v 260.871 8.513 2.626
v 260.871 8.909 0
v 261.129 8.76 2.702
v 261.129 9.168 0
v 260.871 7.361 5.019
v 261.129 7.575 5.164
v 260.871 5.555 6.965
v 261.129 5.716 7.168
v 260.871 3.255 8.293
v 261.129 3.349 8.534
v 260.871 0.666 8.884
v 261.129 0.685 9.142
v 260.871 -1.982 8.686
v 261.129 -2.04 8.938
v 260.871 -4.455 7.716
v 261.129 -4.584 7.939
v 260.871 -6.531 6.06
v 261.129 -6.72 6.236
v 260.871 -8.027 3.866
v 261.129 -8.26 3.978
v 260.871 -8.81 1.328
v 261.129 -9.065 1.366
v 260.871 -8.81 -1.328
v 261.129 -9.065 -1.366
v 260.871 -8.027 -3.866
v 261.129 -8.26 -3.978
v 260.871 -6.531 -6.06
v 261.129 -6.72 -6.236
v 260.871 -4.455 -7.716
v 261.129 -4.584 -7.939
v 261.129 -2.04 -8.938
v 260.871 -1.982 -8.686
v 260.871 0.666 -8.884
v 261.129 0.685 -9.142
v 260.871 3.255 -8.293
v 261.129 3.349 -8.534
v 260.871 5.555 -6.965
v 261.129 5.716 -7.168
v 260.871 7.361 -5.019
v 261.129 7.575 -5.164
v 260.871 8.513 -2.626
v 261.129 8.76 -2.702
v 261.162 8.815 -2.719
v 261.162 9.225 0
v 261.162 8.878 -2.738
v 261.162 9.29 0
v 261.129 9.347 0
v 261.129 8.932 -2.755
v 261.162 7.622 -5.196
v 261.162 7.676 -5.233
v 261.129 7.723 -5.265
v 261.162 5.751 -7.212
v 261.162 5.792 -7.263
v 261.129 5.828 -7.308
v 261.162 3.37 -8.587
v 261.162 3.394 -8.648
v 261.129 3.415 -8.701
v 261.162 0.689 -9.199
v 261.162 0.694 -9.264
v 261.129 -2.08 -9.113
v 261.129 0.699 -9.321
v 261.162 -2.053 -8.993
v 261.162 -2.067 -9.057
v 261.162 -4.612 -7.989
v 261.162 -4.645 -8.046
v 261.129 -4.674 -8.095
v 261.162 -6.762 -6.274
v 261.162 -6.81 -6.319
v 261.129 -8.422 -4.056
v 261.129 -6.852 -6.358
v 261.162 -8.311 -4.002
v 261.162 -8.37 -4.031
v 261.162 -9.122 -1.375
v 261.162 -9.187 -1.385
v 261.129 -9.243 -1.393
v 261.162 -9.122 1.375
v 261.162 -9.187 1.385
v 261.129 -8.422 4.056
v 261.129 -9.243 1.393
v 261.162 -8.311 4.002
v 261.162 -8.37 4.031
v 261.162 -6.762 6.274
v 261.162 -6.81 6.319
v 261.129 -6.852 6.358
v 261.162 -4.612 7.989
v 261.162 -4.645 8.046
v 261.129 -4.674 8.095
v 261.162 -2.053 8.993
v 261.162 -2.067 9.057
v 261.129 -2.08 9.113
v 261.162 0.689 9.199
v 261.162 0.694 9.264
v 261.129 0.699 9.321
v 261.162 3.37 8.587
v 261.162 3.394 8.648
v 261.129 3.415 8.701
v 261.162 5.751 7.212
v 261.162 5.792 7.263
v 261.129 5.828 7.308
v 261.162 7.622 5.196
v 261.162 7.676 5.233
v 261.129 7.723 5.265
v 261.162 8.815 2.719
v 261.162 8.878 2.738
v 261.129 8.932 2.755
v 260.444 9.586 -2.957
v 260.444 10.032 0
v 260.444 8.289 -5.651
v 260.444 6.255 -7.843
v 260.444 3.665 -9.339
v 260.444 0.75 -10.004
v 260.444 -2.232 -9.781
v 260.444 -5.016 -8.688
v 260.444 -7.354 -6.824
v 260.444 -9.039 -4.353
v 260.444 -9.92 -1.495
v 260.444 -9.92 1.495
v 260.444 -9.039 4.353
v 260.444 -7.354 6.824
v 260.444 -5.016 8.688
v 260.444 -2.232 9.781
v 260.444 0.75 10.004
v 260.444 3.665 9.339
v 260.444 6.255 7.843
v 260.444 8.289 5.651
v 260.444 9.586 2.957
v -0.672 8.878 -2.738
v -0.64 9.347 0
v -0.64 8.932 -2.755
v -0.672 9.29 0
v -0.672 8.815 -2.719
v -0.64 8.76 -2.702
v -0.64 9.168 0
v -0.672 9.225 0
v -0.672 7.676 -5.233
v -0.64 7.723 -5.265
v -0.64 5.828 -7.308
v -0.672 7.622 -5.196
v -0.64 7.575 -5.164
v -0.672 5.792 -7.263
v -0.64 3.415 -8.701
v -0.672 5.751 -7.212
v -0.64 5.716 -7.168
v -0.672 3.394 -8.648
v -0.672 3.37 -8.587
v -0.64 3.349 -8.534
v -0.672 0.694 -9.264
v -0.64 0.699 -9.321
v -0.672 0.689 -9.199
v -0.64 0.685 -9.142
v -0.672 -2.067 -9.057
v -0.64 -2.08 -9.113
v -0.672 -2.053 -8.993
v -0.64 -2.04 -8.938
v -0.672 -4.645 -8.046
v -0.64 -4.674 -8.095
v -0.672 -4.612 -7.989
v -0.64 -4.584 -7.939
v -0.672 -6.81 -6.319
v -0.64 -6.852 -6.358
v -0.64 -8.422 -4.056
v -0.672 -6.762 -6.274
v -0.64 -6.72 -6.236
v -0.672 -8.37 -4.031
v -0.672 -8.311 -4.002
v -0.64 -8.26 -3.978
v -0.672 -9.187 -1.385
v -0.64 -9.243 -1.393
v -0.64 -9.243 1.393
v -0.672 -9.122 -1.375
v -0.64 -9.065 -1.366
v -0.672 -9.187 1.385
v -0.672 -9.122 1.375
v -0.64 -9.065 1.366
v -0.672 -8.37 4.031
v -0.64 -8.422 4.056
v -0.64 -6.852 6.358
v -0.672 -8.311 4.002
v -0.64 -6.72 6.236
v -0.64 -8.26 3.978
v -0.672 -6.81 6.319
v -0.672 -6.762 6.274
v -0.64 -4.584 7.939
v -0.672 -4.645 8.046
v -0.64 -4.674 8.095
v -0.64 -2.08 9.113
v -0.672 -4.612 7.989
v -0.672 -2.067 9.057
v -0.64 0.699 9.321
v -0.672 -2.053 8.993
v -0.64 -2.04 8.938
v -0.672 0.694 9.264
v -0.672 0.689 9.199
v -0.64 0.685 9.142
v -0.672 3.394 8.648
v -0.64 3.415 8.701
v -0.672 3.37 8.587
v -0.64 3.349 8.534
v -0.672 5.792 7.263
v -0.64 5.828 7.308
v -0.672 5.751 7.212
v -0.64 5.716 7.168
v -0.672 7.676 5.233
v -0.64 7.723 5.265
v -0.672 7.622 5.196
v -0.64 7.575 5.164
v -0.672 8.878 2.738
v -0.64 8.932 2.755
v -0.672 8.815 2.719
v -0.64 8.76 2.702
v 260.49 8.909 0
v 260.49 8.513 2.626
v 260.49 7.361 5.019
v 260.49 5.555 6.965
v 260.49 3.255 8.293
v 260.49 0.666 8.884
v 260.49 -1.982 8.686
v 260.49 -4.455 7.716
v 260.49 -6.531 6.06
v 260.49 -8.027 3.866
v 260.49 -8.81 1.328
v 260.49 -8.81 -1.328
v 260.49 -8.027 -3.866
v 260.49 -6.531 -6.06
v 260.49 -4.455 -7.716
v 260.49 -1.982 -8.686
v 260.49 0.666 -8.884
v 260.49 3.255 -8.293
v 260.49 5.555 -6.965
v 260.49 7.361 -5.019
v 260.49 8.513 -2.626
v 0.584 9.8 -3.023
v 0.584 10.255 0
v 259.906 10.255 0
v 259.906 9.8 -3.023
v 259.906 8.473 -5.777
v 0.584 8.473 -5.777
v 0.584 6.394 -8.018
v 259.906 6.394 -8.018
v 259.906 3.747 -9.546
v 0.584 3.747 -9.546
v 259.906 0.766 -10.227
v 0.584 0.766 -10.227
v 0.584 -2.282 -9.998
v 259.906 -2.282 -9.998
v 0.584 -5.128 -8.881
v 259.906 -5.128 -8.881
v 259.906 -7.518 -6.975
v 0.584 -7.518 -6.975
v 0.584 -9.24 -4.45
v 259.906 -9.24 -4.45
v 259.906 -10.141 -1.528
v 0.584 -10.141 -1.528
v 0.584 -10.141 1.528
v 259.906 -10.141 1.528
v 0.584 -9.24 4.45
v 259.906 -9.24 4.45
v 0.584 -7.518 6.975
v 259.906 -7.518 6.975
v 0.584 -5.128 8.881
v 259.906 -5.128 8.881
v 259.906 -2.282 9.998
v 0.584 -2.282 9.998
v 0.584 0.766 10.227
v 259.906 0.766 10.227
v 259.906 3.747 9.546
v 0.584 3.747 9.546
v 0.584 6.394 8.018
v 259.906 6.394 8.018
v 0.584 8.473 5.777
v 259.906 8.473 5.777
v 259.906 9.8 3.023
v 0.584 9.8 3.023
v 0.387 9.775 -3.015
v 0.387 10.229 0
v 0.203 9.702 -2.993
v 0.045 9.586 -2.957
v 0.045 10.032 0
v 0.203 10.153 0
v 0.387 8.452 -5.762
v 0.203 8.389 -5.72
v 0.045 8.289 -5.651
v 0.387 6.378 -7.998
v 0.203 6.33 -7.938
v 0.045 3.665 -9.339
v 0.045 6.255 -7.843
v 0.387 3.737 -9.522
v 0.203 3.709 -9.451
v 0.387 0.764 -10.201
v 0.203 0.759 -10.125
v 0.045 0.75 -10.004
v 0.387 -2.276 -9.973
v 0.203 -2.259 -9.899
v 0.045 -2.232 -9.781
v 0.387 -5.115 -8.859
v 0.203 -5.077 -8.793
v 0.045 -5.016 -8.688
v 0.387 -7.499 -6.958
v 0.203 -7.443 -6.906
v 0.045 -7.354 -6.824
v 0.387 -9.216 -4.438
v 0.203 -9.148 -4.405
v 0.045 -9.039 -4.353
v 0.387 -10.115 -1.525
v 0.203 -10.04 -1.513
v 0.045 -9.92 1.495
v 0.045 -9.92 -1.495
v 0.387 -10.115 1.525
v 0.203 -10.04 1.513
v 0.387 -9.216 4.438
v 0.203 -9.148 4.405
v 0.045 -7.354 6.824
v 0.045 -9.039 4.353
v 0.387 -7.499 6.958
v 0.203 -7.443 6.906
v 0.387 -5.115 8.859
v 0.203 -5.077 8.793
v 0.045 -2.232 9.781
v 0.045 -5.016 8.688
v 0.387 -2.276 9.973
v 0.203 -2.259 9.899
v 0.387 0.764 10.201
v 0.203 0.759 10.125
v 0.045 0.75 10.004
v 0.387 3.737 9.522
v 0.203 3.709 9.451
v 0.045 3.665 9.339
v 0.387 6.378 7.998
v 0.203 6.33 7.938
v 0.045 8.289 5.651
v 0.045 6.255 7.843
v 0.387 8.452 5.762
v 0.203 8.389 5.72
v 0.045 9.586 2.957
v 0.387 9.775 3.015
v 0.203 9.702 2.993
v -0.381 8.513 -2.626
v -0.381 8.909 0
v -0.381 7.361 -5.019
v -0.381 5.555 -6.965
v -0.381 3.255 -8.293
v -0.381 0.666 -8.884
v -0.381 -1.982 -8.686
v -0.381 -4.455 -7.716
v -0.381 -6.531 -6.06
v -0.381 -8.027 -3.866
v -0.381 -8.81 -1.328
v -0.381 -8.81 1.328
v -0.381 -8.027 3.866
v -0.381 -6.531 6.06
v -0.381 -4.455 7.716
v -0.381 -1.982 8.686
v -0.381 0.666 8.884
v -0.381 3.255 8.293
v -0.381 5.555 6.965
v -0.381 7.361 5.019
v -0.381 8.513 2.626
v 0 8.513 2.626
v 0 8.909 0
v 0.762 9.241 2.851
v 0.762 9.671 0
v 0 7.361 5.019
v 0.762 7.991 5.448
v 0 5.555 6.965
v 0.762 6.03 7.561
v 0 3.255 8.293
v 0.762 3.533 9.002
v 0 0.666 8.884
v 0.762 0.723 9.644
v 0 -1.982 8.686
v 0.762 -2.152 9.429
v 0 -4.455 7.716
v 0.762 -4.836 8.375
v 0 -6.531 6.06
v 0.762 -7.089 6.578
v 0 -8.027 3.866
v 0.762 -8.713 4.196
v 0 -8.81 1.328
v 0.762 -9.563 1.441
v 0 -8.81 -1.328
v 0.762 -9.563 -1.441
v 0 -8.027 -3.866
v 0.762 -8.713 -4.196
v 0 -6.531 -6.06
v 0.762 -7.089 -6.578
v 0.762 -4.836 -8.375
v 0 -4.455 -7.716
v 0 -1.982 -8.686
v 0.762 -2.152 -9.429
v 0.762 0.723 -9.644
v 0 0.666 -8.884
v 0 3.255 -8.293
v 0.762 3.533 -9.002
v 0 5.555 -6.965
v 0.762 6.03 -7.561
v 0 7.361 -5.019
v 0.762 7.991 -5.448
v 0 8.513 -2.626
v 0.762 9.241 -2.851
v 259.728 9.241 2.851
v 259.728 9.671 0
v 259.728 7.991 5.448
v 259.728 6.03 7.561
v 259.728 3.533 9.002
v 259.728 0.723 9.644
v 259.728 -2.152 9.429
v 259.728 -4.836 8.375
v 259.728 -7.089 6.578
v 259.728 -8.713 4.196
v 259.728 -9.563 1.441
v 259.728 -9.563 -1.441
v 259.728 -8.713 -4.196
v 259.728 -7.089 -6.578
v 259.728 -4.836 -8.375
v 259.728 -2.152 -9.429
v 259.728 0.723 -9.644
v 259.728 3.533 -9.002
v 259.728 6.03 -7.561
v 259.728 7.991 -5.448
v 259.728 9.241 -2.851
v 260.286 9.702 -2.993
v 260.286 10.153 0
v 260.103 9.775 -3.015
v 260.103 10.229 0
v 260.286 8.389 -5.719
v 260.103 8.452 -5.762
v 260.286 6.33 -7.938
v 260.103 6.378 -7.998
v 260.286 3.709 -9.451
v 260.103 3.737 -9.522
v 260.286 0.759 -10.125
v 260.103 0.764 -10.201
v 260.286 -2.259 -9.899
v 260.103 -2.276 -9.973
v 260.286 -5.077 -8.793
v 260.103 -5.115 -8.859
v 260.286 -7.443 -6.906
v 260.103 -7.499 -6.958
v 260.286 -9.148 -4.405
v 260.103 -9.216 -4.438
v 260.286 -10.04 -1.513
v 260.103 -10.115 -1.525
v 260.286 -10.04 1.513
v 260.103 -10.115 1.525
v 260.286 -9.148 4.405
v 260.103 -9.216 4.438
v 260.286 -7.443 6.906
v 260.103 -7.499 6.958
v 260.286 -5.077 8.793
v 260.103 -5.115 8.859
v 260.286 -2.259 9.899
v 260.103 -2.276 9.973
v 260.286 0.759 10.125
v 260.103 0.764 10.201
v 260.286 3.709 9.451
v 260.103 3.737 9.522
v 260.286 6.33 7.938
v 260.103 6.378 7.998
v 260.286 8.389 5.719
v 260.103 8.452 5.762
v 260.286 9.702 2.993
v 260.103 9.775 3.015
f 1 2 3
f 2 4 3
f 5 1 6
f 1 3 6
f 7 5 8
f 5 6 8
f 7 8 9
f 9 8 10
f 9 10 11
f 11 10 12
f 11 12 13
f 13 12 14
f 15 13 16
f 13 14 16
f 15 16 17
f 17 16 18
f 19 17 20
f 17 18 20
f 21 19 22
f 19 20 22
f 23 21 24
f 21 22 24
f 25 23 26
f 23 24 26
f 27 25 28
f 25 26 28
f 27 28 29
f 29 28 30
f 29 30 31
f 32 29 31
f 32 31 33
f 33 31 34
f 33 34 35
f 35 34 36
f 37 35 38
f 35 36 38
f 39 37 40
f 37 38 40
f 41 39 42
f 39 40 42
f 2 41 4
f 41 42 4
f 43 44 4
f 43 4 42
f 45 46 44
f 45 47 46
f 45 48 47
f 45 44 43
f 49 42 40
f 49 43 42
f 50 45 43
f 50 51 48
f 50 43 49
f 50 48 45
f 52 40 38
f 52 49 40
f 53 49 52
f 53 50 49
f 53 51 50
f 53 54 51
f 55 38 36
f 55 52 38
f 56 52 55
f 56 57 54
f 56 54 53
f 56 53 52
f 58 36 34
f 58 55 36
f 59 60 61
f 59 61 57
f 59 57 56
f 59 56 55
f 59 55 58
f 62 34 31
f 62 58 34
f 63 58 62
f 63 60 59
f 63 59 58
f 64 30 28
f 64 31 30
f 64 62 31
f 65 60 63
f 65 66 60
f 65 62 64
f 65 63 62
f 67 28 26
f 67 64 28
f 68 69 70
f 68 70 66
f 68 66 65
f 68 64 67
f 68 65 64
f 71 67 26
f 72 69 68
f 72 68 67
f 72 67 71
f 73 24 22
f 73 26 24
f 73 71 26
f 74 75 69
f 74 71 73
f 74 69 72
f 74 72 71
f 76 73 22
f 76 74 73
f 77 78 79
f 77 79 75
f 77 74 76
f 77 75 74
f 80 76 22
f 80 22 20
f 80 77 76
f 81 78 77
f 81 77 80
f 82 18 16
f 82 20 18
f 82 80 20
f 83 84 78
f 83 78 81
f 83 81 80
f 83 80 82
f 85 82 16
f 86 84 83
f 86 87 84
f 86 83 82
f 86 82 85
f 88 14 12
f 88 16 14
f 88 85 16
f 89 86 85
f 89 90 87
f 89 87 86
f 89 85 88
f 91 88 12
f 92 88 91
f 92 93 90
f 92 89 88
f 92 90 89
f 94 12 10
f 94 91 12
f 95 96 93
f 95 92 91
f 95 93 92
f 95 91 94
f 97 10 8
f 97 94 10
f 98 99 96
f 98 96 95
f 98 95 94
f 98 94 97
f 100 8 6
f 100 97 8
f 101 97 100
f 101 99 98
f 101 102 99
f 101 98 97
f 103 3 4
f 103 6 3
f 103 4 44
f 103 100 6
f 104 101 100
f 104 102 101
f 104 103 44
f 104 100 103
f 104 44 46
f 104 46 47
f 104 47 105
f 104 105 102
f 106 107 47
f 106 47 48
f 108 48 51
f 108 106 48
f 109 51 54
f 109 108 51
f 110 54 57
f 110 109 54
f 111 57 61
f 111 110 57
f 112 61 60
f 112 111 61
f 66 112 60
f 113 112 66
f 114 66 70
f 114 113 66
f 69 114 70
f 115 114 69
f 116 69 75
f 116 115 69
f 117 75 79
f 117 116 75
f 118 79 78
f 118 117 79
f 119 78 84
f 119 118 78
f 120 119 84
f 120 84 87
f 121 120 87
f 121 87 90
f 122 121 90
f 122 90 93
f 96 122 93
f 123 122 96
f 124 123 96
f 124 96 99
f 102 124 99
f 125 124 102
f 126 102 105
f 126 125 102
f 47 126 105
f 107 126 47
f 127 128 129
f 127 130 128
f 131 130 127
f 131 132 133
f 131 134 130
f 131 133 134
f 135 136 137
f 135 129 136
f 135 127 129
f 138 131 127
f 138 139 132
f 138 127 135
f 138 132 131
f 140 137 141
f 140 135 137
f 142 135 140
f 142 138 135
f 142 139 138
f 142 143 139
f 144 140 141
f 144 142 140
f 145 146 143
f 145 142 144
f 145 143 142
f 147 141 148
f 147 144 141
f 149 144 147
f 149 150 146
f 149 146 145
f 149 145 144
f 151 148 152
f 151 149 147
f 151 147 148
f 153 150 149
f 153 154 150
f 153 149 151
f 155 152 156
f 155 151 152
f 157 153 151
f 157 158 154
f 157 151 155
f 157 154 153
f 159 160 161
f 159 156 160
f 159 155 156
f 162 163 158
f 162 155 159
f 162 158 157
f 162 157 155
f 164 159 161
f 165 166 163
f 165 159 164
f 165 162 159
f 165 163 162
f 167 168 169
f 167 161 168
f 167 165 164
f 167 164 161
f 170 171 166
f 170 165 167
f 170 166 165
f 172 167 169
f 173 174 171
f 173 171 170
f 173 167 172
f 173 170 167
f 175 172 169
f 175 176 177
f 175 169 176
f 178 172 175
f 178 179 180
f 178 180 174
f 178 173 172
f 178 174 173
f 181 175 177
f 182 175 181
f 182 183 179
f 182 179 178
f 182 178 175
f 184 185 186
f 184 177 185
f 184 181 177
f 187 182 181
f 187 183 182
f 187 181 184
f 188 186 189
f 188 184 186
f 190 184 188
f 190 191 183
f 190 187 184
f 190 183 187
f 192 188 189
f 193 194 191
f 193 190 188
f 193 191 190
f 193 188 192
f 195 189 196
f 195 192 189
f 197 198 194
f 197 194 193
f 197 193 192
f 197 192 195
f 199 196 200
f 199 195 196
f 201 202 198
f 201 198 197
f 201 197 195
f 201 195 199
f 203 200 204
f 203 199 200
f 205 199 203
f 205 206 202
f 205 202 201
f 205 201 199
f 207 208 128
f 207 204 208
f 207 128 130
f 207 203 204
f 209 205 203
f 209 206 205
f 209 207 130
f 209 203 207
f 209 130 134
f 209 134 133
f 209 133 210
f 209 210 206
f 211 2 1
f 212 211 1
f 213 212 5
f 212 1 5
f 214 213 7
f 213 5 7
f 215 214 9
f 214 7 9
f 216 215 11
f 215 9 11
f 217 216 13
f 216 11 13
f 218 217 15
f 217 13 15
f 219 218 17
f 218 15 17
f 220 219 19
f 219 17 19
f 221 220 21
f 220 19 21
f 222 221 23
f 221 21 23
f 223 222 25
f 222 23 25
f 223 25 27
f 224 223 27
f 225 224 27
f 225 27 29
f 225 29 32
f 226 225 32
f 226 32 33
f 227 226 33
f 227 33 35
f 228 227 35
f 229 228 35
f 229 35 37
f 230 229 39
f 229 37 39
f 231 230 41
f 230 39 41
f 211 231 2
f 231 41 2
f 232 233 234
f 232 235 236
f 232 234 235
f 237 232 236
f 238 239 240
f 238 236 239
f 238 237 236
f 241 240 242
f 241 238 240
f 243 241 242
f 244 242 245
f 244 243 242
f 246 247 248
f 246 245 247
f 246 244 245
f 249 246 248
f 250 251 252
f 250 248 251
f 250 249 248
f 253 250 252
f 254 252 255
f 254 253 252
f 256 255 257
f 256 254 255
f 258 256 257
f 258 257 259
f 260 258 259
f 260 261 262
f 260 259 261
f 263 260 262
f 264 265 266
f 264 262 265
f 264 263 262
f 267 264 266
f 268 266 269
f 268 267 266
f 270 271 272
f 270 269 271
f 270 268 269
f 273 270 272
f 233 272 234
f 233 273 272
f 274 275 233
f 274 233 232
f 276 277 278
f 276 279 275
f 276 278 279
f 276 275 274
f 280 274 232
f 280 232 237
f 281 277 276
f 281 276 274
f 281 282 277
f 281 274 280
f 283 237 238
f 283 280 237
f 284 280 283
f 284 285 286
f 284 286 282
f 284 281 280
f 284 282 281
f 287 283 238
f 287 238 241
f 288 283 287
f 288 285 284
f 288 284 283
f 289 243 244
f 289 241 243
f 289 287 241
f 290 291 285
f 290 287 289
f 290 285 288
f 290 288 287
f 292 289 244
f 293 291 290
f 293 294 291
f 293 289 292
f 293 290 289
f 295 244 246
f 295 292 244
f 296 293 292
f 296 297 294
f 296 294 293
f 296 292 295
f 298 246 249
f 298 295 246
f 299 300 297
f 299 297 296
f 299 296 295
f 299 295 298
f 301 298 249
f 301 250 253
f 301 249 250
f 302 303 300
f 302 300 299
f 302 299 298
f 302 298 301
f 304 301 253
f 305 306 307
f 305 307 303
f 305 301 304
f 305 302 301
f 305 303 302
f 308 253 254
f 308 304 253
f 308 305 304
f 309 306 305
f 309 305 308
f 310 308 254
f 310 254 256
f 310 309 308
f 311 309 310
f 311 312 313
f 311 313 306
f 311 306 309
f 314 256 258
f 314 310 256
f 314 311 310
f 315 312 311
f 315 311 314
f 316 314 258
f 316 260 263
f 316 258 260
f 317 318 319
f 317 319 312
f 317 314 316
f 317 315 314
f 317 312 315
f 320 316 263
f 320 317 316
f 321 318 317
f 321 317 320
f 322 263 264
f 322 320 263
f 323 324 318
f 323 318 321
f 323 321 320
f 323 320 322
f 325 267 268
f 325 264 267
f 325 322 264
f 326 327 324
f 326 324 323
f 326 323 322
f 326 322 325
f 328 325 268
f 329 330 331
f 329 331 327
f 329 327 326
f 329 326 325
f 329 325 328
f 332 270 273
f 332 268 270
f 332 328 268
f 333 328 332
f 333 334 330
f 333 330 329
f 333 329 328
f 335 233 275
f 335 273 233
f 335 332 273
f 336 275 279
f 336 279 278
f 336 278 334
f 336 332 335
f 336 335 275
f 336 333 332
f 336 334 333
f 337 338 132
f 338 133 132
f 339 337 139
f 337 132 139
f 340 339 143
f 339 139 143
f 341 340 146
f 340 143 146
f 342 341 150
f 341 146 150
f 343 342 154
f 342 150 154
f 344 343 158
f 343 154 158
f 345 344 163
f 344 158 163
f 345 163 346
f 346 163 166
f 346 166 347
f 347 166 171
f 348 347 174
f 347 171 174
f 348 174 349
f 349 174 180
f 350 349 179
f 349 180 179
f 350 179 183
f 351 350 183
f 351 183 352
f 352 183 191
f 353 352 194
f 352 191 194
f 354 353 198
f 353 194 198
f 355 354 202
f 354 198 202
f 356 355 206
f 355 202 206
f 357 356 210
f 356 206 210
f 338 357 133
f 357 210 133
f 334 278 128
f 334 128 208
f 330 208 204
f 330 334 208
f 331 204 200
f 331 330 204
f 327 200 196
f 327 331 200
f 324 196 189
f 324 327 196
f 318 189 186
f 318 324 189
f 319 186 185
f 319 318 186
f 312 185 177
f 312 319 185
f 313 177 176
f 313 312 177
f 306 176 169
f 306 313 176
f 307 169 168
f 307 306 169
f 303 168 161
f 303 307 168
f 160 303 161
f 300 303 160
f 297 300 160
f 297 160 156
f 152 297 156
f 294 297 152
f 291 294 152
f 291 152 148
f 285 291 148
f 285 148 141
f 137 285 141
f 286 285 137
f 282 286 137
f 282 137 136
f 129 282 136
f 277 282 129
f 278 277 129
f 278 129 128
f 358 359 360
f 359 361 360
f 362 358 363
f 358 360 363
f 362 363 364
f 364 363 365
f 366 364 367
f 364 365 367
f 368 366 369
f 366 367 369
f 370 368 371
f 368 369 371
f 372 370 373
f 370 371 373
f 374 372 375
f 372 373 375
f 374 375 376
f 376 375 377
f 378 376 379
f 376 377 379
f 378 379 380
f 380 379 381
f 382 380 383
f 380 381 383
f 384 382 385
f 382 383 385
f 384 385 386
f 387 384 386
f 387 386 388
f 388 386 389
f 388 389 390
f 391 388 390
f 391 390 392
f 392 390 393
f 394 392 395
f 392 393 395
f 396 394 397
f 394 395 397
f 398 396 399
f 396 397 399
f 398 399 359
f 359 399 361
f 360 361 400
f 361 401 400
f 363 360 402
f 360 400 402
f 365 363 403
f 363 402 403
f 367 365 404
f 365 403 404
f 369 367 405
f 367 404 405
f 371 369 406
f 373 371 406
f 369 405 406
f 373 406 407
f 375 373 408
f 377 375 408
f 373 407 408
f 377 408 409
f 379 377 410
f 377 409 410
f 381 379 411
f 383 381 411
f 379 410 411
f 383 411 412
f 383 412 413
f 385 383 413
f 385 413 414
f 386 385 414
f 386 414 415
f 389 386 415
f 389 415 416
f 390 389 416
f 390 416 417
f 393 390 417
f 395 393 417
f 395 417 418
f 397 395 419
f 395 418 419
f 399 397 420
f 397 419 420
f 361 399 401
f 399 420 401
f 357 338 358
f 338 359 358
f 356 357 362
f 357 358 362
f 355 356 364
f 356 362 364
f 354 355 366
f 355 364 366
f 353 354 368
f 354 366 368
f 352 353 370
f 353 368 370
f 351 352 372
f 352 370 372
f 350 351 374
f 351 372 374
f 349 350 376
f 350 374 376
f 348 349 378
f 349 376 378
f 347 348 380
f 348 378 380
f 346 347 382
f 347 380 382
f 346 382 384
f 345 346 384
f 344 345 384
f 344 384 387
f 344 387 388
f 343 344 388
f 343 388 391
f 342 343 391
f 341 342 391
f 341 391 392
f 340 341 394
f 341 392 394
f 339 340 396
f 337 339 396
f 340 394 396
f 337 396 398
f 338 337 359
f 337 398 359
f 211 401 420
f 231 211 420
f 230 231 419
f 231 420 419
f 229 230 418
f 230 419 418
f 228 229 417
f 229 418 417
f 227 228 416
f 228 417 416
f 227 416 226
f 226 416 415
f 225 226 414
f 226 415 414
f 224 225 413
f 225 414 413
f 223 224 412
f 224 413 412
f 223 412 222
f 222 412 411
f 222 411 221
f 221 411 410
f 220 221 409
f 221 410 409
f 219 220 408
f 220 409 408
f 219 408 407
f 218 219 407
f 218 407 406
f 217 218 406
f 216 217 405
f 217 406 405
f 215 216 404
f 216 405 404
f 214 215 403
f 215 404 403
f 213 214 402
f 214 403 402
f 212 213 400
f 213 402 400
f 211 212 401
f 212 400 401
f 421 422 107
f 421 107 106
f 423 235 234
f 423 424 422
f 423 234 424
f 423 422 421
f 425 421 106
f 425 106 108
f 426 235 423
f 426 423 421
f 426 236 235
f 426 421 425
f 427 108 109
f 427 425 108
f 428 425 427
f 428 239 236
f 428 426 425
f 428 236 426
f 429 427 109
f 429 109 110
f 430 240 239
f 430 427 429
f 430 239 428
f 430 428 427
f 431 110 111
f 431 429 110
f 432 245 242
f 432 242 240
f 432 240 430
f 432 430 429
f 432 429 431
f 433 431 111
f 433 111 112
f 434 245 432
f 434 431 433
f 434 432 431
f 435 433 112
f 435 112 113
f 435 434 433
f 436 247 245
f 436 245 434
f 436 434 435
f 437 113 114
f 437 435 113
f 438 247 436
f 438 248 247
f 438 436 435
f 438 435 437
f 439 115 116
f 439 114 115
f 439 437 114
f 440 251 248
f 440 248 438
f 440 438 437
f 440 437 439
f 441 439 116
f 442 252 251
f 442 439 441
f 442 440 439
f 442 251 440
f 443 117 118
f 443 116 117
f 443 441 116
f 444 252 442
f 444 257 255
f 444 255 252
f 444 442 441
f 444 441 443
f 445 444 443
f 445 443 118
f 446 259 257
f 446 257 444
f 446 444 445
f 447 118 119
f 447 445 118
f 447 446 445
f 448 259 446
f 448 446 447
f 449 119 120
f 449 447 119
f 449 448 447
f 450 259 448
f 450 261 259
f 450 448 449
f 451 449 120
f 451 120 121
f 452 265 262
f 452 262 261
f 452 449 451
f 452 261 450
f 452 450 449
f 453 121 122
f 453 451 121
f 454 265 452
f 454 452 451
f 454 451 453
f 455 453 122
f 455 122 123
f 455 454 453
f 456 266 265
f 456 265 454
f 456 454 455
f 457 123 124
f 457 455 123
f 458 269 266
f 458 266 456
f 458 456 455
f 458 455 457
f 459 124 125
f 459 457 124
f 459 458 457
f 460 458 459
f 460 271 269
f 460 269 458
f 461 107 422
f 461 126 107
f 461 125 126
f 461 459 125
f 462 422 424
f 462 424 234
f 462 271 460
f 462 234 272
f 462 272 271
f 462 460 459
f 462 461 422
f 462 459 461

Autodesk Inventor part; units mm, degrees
sketch "Sketch_1" plane through (0, 0, 0) normal (0, 0, 1) x (1, 0, 0)
  line L0 (260.4897, 0) -> (0, 0)
  arc A0 (-0.6395, 9.3472) -> (-0.6395, 9.1676) centre (-0.5497, 9.2574) ccw
  line L1 (-0.6395, 9.1676) -> (-0.381, 8.9091)
  line L2 (-0.381, 8.9091) -> (0, 8.9091)
  line L3 (0, 8.9091) -> (0.762, 9.671)
  line L4 (0.762, 9.671) -> (259.7277, 9.671)
  line L5 (259.7277, 9.671) -> (260.4897, 8.9091)
  line L6 (260.4897, 8.9091) -> (260.8707, 8.9091)
  line L7 (260.8707, 8.9091) -> (261.1292, 9.1676)
  arc A1 (261.1292, 9.1676) -> (261.1292, 9.3472) centre (261.0394, 9.2574) ccw
  line L8 (261.1292, 9.3472) -> (260.4443, 10.0321)
  arc A2 (260.4443, 10.0321) -> (259.9055, 10.2553) centre (259.9055, 9.4933) ccw
  line L9 (259.9055, 10.2553) -> (0.5842, 10.2553)
  arc A3 (0.5842, 10.2553) -> (0.0454, 10.0321) centre (0.5842, 9.4933) ccw
  line L10 (0.0454, 10.0321) -> (-0.6395, 9.3472)
revolve "Revolution1" add sketch "Sketch_1" angle 360 about axis through (260.4897, 0, 0) along (1, 0, 0)
ref_plane "tube_front_XY" through (0, 0, 0) normal (1, 0, 0) x (0, 0, -1)
ref_plane "tube_front_YZ" through (0, 0, 0) normal (0, 0, -1) x (0, 1, 0)
ref_plane "tube_front_ZX" through (0, 0, 0) normal (0, 1, 0) x (1, 0, 0)
ref_plane "tube_rear_XY" through (260.4897, 0, 0) normal (1, 0, 0) x (0, 0, -1)
ref_plane "tube_rear_YZ" through (260.4897, 0, 0) normal (0, 0, -1) x (0, 1, 0)
ref_plane "tube_rear_ZX" through (260.4897, 0, 0) normal (0, 1, 0) x (1, 0, 0)
ref_plane "cp1_XY" through (130.2449, 10.2553, 0) normal (1, 0, 0) x (0, 0, -1)
ref_plane "cp1_YZ" through (130.2449, 10.2553, 0) normal (0, 0, -1) x (0, 1, 0)
ref_plane "cp1_ZX" through (130.2449, 10.2553, 0) normal (0, 1, 0) x (1, 0, 0)
ref_plane "cp2_XY" through (130.2449, 0, -10.2553) normal (1, 0, 0) x (0, 0, -1)
ref_plane "cp2_YZ" through (130.2449, 0, -10.2553) normal (0, 0, -1) x (0, 1, 0)
ref_plane "cp2_ZX" through (130.2449, 0, -10.2553) normal (0, 1, 0) x (1, 0, 0)
ref_plane "cp3_XY" through (130.2449, -10.2553, 0) normal (1, 0, 0) x (0, 0, -1)
ref_plane "cp3_YZ" through (130.2449, -10.2553, 0) normal (0, 0, -1) x (0, 1, 0)
ref_plane "cp3_ZX" through (130.2449, -10.2553, 0) normal (0, 1, 0) x (1, 0, 0)
ref_plane "cp4_XY" through (130.2449, 0, 10.2553) normal (1, 0, 0) x (0, 0, -1)
ref_plane "cp4_YZ" through (130.2449, 0, 10.2553) normal (0, 0, -1) x (0, 1, 0)
ref_plane "cp4_ZX" through (130.2449, 0, 10.2553) normal (0, 1, 0) x (1, 0, 0)
properties part number "04R-10.25550" material "Stainless Steel"
